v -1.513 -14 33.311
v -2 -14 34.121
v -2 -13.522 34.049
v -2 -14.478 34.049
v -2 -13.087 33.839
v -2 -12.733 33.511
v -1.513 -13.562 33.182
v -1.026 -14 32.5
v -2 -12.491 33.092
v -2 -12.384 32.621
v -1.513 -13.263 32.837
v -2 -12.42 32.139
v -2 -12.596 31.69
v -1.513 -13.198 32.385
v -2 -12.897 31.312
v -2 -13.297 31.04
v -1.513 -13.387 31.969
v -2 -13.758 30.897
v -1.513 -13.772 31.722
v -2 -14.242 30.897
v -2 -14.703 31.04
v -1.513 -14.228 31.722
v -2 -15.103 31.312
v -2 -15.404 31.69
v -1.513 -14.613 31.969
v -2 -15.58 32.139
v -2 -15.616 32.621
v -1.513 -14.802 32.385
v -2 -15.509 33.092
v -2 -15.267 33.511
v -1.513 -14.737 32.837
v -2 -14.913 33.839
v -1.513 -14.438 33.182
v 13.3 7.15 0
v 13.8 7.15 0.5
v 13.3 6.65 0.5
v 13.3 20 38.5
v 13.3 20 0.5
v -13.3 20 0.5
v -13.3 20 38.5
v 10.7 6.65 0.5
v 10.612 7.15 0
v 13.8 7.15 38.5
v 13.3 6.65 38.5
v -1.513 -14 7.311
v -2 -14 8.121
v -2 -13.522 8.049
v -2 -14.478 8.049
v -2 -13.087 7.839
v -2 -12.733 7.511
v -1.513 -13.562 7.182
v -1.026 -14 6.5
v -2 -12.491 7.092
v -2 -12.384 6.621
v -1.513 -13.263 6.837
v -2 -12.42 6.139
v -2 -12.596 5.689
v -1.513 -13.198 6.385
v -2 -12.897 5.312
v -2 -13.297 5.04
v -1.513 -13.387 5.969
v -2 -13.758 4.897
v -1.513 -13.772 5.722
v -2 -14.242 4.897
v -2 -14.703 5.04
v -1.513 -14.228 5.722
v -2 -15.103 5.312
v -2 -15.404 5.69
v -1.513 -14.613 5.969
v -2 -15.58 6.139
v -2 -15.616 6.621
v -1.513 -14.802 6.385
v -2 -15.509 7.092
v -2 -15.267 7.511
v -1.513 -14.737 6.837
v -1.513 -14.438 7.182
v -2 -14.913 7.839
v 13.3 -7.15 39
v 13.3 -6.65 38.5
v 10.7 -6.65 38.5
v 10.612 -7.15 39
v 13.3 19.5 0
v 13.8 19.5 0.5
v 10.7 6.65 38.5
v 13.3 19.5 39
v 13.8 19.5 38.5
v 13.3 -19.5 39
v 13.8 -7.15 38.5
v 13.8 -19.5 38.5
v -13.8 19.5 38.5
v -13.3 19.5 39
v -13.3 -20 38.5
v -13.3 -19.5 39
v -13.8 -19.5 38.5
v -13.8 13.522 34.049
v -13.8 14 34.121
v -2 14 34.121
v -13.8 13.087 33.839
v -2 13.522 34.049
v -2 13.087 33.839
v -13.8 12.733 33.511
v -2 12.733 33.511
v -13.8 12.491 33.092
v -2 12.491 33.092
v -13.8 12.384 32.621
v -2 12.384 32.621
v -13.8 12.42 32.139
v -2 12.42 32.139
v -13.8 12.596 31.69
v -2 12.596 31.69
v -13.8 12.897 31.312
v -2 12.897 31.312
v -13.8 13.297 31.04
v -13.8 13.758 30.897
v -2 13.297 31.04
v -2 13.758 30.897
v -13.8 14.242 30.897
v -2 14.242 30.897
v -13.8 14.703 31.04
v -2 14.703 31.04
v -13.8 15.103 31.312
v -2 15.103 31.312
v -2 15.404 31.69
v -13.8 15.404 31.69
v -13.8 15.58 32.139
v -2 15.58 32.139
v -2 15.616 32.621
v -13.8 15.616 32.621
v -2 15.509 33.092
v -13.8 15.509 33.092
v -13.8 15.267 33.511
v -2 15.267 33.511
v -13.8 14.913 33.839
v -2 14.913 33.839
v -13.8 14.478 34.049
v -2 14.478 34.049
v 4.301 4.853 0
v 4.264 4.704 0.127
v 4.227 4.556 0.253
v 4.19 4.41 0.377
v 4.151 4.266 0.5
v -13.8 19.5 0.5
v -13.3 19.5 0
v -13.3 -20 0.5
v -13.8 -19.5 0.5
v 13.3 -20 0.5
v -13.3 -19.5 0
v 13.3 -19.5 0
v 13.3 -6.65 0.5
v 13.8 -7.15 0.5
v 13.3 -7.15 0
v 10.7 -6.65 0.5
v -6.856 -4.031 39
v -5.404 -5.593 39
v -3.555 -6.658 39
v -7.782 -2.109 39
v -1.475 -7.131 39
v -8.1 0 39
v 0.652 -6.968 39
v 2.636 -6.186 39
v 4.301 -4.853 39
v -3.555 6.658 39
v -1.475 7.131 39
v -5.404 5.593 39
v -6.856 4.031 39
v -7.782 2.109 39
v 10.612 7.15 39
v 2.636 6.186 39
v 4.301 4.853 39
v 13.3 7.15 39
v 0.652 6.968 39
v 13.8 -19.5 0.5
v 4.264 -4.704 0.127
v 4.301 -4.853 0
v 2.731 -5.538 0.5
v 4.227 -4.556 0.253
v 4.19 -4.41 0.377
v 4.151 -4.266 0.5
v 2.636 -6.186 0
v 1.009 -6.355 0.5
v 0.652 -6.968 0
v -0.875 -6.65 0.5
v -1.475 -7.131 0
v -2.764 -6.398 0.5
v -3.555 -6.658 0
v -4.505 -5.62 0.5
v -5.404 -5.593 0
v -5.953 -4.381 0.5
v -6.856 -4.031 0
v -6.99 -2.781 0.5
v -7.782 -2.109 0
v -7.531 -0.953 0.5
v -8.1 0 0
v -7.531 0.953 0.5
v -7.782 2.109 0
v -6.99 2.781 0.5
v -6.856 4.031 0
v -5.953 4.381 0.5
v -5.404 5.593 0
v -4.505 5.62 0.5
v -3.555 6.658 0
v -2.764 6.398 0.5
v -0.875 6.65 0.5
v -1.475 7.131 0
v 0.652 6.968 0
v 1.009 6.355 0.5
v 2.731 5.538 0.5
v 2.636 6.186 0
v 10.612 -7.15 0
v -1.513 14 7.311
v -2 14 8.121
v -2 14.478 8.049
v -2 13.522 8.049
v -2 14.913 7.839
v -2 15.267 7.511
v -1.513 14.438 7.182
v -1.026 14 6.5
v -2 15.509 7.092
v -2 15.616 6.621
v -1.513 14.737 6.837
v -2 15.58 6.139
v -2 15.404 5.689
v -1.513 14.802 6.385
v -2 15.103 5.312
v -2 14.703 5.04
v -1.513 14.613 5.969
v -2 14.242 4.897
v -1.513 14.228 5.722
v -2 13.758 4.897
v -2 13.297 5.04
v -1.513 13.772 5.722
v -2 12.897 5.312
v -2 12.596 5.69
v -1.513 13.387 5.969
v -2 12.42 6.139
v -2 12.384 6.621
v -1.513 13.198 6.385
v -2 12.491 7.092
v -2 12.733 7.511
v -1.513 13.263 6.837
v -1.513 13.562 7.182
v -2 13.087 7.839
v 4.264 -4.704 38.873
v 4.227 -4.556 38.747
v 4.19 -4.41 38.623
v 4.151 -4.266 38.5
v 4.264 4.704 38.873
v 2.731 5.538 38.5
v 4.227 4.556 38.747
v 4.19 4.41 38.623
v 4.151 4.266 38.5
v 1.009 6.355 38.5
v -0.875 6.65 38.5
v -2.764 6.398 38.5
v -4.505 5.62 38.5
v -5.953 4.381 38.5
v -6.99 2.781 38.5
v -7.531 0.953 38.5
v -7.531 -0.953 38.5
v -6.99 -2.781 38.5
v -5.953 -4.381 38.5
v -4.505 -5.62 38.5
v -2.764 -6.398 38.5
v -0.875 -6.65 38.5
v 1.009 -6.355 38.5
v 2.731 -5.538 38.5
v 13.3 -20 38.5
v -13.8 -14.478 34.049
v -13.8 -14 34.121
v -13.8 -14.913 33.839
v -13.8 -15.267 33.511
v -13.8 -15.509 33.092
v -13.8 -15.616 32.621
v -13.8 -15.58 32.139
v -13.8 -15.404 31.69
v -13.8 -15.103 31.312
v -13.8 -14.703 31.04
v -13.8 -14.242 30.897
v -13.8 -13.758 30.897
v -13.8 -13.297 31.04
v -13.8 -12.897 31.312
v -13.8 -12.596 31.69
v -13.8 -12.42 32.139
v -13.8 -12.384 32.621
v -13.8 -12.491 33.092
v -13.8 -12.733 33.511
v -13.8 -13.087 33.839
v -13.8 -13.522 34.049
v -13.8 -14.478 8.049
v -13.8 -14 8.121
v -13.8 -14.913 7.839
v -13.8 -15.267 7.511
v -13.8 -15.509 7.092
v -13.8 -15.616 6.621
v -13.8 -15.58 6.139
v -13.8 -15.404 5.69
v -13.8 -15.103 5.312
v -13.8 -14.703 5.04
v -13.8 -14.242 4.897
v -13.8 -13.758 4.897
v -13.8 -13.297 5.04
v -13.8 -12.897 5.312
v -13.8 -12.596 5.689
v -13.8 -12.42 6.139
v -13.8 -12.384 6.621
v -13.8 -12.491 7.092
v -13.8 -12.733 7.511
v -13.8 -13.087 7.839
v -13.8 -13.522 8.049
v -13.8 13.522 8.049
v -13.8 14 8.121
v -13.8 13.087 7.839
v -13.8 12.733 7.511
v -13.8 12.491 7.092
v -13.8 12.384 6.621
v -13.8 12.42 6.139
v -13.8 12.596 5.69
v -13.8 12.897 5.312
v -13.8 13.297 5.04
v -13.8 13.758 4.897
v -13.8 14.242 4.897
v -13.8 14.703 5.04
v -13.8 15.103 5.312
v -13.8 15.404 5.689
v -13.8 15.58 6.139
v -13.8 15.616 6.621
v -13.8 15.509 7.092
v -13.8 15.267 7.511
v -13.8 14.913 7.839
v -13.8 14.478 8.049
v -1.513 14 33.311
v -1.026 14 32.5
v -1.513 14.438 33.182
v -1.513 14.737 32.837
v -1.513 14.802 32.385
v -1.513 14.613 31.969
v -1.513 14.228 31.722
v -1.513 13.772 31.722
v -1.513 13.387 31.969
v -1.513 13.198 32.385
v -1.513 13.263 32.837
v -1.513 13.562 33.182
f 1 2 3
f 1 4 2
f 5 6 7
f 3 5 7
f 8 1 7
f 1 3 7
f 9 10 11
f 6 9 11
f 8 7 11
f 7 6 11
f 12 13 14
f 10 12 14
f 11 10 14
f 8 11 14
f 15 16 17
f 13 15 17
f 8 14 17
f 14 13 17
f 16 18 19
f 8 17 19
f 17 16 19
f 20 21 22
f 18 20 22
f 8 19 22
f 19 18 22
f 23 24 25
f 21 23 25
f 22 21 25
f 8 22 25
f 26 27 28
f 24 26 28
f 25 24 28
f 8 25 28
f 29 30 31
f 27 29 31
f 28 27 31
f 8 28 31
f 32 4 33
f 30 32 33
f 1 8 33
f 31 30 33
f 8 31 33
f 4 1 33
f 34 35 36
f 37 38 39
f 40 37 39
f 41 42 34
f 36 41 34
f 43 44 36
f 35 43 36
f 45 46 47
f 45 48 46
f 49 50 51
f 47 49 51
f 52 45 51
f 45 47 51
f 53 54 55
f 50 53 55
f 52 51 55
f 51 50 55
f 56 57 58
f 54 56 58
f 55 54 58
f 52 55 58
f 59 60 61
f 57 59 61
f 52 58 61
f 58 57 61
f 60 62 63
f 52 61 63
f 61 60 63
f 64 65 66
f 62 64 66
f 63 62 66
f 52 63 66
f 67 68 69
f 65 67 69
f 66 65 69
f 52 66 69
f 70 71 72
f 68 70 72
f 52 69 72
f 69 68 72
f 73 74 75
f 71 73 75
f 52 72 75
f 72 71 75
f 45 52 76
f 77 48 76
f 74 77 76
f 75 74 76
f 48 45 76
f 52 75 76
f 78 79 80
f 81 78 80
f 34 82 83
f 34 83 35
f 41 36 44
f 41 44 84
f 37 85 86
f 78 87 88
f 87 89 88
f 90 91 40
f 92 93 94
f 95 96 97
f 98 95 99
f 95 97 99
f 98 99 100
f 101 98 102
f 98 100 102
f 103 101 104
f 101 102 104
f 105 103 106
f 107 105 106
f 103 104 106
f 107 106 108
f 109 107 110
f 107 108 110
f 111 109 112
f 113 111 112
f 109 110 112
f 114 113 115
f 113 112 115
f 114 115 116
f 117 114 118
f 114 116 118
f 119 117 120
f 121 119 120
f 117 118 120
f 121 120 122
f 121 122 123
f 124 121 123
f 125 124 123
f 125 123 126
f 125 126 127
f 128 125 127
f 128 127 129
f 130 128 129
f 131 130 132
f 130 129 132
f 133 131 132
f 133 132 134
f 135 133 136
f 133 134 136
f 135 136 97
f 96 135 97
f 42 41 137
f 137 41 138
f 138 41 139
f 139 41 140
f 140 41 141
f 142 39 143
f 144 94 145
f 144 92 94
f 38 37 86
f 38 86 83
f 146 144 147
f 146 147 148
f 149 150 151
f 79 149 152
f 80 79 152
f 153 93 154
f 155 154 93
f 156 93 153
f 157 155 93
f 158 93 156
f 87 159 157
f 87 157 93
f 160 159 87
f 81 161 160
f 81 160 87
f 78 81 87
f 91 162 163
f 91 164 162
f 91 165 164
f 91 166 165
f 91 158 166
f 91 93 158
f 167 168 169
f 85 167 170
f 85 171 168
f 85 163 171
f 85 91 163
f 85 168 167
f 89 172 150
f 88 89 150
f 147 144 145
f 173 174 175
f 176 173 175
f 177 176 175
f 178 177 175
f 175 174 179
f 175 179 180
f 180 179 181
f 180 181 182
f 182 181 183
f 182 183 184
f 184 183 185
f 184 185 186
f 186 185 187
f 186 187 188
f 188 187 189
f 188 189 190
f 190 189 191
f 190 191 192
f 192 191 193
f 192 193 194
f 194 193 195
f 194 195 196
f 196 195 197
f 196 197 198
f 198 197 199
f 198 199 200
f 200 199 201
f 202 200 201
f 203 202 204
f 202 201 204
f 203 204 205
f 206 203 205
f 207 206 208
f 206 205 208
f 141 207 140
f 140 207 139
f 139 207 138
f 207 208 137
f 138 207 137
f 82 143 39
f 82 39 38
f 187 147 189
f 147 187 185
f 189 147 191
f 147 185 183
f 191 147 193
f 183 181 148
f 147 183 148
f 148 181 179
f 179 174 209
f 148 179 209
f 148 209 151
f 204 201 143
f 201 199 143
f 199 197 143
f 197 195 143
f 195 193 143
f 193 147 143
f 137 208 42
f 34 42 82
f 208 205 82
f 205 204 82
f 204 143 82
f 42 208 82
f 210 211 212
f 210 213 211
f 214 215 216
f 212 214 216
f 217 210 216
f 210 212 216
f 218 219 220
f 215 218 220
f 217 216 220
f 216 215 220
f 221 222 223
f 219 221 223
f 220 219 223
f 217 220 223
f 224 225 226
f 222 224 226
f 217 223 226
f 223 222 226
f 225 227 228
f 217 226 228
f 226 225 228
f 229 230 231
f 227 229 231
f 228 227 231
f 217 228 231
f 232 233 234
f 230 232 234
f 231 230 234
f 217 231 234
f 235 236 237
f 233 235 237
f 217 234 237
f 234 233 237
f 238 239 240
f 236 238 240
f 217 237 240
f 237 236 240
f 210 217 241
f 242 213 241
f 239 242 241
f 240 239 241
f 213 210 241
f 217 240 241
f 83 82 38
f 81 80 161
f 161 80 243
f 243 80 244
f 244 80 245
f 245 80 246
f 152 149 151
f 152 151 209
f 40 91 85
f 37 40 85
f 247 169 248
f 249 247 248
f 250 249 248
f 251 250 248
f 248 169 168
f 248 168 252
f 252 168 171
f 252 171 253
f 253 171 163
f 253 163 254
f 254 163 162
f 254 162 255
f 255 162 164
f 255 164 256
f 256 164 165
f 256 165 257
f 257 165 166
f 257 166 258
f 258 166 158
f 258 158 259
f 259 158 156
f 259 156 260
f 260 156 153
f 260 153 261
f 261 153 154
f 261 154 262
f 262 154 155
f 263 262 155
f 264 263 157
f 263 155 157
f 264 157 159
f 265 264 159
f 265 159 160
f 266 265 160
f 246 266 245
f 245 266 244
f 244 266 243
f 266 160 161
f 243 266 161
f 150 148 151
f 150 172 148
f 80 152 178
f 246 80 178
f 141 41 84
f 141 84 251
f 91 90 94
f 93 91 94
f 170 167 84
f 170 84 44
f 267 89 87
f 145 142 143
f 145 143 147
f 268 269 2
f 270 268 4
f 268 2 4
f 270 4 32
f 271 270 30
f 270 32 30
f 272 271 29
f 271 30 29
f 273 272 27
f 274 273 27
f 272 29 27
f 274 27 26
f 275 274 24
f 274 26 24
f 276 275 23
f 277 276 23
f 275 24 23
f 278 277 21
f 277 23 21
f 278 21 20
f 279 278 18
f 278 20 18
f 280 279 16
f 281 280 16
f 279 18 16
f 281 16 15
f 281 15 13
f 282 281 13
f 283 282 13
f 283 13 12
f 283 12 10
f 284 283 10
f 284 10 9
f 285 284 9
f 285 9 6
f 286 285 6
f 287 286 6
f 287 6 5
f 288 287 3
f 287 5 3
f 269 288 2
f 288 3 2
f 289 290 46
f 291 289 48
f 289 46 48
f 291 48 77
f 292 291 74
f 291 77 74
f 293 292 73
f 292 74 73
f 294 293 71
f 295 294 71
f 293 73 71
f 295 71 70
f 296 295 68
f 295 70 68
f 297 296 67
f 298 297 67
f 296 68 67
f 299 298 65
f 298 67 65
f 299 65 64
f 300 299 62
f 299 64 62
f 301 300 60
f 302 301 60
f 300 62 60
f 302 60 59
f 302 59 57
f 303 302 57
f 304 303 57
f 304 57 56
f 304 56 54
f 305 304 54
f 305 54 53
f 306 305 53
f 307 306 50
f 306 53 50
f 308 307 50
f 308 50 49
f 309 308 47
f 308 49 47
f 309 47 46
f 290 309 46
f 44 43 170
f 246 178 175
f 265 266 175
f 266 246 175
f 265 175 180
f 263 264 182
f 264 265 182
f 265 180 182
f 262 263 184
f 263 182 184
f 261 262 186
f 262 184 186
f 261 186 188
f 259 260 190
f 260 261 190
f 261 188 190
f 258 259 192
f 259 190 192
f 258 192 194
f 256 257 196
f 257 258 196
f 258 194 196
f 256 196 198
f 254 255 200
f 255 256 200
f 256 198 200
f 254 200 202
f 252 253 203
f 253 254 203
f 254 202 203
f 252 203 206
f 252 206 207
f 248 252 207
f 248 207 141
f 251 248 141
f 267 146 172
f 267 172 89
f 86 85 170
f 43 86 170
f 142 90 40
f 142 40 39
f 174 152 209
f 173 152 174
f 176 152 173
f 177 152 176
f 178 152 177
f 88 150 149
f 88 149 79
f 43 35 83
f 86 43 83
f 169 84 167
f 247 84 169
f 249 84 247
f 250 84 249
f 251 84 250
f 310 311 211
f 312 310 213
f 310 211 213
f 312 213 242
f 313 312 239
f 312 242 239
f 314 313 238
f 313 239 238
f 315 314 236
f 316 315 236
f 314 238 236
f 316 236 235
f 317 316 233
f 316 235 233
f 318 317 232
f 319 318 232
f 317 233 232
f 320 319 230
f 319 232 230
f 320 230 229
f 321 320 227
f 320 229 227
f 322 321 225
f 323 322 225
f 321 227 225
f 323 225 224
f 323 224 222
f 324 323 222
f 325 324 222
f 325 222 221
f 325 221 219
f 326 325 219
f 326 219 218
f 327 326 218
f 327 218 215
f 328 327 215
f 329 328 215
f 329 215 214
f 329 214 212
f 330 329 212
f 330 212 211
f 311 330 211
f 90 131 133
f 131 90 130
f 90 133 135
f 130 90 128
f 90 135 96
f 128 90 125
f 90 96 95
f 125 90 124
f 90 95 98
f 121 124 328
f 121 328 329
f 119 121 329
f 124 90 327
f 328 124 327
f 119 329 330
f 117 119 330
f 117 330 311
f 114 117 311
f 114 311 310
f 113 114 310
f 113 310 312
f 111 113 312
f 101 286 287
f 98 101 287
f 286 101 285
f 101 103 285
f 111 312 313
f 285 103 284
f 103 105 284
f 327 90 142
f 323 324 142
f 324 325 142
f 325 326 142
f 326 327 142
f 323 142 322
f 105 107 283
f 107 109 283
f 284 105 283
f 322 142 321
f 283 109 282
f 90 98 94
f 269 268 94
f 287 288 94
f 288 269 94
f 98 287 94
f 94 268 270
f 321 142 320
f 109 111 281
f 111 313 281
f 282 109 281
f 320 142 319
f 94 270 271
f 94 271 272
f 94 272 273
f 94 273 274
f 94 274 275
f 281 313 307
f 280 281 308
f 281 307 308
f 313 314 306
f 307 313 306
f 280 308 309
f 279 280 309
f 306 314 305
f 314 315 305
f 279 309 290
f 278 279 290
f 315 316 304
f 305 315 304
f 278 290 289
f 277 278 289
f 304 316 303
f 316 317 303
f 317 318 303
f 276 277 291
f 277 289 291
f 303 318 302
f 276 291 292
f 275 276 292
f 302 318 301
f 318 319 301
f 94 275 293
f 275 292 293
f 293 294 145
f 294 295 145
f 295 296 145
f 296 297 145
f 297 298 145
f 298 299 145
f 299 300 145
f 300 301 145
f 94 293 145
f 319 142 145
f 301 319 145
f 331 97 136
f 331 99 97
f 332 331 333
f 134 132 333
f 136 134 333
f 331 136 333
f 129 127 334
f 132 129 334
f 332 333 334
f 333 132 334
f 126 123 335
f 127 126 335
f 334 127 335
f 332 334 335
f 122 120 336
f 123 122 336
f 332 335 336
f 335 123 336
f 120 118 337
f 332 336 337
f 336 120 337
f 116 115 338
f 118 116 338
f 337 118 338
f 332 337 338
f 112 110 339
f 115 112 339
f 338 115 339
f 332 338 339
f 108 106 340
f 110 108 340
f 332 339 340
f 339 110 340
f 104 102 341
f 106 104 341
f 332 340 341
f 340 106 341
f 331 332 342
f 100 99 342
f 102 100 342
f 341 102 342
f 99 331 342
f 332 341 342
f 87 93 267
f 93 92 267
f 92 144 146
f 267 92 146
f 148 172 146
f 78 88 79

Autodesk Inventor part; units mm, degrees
ref_plane "YZ Plane" through (0, 0, 0) normal (1, 0, 0) x (0, 1, 0)
ref_plane "XZ Plane" through (0, 0, 0) normal (0, 1, 0) x (-1, 0, 0)
ref_plane "XY Plane" through (0, 0, 0) normal (0, 0, 1) x (1, 0, 0)
sketch "Skizze1" plane through (0, 0, 0) normal (0, 0, 1) x (1, 0, 0)
  line L0 (13.8, 20) -> (-13.8, 20)
  line L1 (-13.8, 20) -> (-13.8, -20)
  line L2 (-13.8, -20) -> (13.8, -20)
  line L3 (13.8, 20) -> (-13.8, -20) construction
  line L4 (-13.8, 20) -> (13.8, -20) construction
  line L5 (13.8, 20) -> (13.8, 6.65) construction
  line L6 (13.8, 6.65) -> (10.7, 6.65)
  line L7 (-13.8, 0) -> (-0.95, 0) construction
  arc A0 (4.1513, 4.266) -> (4.1513, -4.266) centre (-0.95, 0) ccw
  line L8 (13.8, 6.65) -> (13.8, -6.65) construction
  line L9 (13.8, -6.65) -> (10.7, -6.65)
  line L10 (13.8, -20) -> (13.8, -6.65)
  line L11 (13.8, 6.65) -> (13.8, 20)
  line L12 (10.7, 6.65) -> (4.1513, 4.266)
  line L13 (10.7, -6.65) -> (4.1513, -4.266)
  point P0 (0, 0)
  dimension "d0" = 27.6
  dimension "d1" = 40
  dimension "d2" = 13.35
  dimension "d3" = 3.1
  dimension "d4" = 12.85
  dimension "d5" = 13.3
  dimension "d7" = 13.3
  dimension "d8" = 3.1
  dimension "d24" = 6.5487
  dimension "d25" = 6.5487
extrude "Extrusion1" add sketch "Skizze1" along normal blind 39
sketch "Skizze2" plane through (-13.8, -20, 0) normal (-1, 0, 0) x (0, 0, 1)
  line L0 (0, 40) -> (39, 40) construction
  line L1 (0, 0) -> (39, 0) construction
  line L2 (0, 40) -> (39, 0) construction
  line L3 (39, 40) -> (0, 0) construction
  line L4 (6.5, 6) -> (32.5, 6) construction
  line L5 (32.5, 6) -> (32.5, 34) construction
  line L6 (32.5, 34) -> (6.5, 34) construction
  line L7 (6.5, 34) -> (6.5, 6) construction
  line L8 (6.5, 6) -> (32.5, 34) construction
  line L9 (32.5, 6) -> (6.5, 34) construction
  point P0 (0, 20)
  point P1 (19.5, 20)
  dimension "d12" = 26
  dimension "d13" = 28
hole "Bohrung1" at (-13.8, 14, 6.5) at (-13.8, 14, 32.5) at (-13.8, -14, 32.5) at (-13.8, -14, 6.5) direction (1, 0, 0) diameter 3.242 depth 11.8 tip angle 118 thread size "M4x0.7" class "6H" standard "ANSI Metric M Profile"
chamfer "Fase1" distance 0.5 angle 45 26 edges at (13.8, 13.325, 39) (13.8, 13.325, 0) (13.8, -13.325, 0) (13.8, -13.325, 39) (13.8, -20, 19.5) (0, -20, 39) (-13.8, 0, 39) (0, 20, 39) (-13.8, 20, 19.5) (0, 20, 0) (13.8, 6.65, 19.5) (13.8, -6.65, 19.5) (-7.6, 0, 39) (7.4257, -5.458, 39) (12.25, -6.65, 39) (7.4257, 5.458, 39) (12.25, 6.65, 39) (-7.6, 0, 0) (7.4257, -5.458, 0) (12.25, -6.65, 0) (12.25, 6.65, 0) (7.4257, 5.458, 0) (0, -20, 0) (-13.8, -20, 19.5) (-13.8, 0, 0) (13.8, 20, 19.5)
chamfer_without_effect "Fase2"
properties part number "Führungswagen" material "Aluminium 6061"
